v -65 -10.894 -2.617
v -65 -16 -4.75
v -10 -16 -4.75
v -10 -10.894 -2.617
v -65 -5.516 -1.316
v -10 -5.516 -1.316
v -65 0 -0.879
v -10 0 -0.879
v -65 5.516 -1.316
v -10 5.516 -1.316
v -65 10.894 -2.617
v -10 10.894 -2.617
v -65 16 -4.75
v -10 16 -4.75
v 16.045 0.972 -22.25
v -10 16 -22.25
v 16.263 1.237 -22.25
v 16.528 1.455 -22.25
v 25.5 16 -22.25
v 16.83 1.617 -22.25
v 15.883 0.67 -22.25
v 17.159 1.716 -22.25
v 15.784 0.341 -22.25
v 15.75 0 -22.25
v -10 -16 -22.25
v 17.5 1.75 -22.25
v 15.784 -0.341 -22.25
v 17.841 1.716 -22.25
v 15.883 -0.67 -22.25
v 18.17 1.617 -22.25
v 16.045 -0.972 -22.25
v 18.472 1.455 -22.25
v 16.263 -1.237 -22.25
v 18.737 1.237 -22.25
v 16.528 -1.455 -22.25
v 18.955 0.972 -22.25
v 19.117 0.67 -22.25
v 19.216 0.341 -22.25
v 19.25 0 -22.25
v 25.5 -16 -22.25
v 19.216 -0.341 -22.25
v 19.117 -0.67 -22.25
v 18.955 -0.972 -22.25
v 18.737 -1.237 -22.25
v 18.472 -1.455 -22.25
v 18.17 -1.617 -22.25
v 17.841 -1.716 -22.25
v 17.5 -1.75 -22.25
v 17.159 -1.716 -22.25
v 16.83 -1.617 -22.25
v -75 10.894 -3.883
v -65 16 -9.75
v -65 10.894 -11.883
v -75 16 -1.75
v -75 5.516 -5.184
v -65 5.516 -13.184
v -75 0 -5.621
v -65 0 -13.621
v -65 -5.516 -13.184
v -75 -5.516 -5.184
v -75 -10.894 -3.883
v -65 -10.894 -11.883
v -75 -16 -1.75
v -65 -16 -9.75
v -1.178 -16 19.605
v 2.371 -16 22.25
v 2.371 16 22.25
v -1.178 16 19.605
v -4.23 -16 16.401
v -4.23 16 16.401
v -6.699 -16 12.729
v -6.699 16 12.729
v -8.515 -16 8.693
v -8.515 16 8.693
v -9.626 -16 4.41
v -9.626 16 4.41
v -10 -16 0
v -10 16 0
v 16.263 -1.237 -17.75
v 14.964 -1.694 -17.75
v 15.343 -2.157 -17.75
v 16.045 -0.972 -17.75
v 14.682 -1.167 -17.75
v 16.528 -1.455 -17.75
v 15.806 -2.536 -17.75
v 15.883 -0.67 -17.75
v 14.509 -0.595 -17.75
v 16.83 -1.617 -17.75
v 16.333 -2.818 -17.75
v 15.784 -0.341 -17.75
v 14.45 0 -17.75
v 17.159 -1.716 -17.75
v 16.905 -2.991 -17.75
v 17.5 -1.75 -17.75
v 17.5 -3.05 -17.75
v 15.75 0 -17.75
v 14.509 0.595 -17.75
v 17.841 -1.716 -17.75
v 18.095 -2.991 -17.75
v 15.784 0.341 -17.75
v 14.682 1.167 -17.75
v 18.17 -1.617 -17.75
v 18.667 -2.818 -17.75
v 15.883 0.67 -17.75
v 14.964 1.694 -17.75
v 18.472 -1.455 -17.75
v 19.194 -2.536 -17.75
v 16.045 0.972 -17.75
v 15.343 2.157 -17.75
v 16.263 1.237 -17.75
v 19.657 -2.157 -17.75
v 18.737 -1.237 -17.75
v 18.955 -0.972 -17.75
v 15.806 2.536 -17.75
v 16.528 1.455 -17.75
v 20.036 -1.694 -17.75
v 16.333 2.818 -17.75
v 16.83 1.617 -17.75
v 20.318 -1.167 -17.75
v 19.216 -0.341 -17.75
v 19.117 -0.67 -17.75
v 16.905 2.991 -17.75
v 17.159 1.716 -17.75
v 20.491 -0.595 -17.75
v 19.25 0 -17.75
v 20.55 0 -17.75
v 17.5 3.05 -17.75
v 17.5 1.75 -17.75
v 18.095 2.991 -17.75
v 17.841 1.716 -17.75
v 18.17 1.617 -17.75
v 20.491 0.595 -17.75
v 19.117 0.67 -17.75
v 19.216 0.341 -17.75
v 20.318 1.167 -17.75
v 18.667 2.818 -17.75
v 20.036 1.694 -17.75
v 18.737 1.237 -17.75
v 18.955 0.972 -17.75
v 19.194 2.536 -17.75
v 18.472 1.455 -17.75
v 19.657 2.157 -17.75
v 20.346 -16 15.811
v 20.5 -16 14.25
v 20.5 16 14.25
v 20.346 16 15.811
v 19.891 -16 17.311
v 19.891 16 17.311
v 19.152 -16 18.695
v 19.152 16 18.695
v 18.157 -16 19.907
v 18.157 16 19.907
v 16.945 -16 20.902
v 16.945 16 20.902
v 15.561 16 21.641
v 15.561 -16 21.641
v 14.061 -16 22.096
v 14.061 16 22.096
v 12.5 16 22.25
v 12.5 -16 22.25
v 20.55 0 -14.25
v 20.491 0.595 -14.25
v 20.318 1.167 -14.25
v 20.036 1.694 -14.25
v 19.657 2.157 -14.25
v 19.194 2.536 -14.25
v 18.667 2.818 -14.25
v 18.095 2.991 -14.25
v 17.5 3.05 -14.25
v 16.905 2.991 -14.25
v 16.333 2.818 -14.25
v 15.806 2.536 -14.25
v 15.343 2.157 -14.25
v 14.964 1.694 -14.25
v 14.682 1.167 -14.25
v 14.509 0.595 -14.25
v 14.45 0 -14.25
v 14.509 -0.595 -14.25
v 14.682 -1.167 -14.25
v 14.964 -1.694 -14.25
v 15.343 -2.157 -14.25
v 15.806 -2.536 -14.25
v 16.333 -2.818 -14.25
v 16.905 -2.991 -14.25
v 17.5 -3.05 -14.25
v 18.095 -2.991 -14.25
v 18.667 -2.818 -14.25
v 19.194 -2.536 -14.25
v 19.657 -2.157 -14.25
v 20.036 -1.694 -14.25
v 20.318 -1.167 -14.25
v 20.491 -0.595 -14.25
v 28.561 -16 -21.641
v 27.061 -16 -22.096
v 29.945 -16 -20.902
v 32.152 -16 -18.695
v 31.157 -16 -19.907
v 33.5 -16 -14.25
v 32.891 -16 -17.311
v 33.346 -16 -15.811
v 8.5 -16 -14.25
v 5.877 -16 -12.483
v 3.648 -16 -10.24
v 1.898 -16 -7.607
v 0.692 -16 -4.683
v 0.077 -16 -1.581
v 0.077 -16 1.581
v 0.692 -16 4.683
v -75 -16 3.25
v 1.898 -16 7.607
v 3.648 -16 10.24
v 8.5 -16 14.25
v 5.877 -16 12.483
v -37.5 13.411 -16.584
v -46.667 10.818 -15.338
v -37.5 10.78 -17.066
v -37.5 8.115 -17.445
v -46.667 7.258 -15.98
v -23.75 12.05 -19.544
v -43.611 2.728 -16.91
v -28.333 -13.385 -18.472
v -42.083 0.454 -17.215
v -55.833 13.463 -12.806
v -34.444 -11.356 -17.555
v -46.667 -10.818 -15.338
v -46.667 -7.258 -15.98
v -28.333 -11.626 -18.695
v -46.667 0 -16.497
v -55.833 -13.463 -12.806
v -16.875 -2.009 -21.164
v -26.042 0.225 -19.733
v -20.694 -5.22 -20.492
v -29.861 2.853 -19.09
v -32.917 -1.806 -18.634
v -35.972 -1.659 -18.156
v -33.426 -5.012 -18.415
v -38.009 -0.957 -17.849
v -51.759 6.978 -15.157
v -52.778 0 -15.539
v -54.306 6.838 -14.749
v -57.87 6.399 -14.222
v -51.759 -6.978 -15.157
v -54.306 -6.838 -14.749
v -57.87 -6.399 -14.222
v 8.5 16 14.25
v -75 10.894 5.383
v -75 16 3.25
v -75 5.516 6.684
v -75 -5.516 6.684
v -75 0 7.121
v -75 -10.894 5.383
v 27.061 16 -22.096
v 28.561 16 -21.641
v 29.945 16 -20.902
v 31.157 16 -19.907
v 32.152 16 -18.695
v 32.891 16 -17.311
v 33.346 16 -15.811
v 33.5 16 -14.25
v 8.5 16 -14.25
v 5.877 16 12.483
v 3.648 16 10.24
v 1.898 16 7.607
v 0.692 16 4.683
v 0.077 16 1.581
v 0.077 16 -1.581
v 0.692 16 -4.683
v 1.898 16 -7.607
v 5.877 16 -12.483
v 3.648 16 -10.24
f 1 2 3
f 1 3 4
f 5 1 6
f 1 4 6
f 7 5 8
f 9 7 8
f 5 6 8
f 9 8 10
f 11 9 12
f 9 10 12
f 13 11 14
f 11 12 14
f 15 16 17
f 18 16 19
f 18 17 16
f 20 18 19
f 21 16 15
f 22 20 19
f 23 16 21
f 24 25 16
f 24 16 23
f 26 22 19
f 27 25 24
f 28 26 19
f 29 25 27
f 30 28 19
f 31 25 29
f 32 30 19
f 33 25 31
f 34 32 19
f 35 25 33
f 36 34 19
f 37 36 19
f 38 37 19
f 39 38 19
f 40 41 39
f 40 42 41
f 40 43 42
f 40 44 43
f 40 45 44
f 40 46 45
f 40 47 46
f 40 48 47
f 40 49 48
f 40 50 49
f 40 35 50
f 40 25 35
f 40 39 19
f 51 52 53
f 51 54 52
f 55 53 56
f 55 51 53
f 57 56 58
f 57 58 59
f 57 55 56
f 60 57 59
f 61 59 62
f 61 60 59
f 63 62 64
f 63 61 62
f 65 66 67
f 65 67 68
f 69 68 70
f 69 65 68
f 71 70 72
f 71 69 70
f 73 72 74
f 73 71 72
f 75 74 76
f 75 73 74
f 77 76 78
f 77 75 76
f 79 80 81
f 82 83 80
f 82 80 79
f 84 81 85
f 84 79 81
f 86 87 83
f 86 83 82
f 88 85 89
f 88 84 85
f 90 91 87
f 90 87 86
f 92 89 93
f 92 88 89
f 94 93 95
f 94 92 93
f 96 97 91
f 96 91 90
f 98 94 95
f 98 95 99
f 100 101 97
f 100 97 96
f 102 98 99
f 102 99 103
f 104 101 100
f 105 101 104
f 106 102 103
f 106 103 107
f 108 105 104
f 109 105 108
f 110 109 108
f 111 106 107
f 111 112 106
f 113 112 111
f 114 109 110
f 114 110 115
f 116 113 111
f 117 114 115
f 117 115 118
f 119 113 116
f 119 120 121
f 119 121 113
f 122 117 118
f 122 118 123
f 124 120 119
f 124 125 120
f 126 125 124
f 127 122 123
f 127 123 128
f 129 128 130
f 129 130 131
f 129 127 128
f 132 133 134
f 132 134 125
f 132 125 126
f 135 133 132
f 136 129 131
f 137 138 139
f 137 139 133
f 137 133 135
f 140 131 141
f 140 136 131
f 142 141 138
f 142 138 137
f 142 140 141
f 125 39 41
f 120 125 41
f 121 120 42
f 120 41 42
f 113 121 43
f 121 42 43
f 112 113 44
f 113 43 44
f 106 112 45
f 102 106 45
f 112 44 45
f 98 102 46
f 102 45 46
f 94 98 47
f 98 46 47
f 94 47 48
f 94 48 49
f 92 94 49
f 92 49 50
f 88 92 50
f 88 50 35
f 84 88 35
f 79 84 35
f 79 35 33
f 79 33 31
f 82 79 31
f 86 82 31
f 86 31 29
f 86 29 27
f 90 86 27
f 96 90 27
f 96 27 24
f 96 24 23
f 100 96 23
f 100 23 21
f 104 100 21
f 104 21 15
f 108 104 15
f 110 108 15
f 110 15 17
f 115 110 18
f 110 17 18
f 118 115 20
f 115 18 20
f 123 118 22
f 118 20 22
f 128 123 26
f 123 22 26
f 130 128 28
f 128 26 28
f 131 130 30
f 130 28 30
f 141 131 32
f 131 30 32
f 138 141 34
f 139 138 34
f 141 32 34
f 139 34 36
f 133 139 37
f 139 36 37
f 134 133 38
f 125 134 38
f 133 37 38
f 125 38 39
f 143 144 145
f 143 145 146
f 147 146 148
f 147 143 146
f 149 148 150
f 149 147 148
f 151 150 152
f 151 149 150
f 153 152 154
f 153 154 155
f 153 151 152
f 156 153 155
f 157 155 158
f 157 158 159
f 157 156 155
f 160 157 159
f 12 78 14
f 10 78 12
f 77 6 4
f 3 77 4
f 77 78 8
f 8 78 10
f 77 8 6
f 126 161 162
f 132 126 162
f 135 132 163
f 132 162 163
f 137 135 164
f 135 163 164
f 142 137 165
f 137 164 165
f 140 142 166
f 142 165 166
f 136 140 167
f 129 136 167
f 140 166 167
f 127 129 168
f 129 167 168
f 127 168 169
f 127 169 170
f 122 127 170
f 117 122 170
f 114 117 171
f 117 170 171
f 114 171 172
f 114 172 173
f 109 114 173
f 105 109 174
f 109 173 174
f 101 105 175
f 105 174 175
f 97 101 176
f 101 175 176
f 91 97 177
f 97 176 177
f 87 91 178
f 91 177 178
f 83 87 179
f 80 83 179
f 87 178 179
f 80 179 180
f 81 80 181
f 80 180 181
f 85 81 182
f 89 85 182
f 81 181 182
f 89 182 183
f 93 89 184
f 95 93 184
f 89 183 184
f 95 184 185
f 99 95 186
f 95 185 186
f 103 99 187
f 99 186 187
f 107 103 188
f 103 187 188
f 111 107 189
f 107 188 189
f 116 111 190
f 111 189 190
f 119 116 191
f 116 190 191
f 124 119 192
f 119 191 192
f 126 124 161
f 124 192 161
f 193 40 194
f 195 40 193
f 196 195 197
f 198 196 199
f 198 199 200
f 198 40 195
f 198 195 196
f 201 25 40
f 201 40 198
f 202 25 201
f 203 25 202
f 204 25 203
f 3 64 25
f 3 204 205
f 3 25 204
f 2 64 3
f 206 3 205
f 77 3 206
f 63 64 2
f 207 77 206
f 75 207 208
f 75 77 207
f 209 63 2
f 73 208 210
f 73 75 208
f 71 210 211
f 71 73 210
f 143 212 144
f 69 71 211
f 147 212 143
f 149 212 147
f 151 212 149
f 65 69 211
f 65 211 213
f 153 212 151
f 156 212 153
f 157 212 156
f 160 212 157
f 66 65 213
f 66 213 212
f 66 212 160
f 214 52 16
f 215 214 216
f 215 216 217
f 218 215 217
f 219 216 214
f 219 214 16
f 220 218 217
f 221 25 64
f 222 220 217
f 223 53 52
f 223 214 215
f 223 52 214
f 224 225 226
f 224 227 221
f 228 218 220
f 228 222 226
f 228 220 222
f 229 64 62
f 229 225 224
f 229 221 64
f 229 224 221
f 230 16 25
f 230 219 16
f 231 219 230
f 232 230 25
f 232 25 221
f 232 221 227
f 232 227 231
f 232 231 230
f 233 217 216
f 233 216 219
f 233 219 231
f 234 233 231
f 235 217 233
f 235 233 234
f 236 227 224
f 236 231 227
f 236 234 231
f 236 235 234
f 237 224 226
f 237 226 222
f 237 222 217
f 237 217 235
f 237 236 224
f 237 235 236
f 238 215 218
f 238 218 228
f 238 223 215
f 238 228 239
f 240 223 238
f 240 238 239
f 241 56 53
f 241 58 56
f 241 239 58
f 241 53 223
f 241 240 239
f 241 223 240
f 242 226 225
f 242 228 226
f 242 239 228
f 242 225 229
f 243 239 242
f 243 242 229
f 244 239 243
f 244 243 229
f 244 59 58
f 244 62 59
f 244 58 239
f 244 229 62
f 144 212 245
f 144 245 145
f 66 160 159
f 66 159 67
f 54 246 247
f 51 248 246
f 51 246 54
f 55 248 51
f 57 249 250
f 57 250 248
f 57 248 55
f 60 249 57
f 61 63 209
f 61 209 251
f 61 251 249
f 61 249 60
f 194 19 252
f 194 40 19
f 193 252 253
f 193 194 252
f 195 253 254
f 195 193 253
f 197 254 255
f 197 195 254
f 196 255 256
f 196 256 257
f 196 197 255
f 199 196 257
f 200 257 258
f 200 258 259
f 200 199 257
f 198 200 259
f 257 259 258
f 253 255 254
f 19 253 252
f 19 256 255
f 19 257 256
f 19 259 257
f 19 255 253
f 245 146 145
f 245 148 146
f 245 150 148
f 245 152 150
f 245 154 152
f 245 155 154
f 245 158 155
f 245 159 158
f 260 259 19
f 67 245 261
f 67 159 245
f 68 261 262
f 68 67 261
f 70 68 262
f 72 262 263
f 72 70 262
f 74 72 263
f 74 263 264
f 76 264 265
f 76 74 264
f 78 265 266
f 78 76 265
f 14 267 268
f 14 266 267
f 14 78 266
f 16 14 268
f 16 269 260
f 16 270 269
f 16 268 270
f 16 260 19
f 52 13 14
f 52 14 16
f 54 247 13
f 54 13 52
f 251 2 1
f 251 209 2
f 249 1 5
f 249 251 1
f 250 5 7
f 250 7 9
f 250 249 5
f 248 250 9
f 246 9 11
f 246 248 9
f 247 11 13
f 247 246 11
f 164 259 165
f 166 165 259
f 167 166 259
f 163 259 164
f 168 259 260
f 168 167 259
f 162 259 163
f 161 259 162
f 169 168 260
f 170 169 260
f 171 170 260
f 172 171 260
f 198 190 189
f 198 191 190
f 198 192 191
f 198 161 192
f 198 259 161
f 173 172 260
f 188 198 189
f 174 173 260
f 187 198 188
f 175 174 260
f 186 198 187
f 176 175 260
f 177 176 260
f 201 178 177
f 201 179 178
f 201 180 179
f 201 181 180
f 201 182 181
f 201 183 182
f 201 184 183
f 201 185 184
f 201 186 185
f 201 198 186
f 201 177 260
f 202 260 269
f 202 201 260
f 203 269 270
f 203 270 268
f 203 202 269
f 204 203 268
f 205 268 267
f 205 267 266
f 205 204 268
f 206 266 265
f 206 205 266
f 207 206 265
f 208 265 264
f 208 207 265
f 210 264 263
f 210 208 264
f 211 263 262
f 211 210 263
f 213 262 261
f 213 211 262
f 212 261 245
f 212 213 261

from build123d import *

# Parameters (mm, degrees)
F1_DEPTH      = 16
F1_DEPTH_BACK = 16
F3_DEPTH      = 55
F8_R          = 1.75
F9_DEPTH      = 25
F10_R         = 3.05
F11_DEPTH     = 3.5


with BuildPart() as f1:
    # F0 (on Front) → F1 (new body, two sides)
    with BuildSketch(Plane.XZ) as f1_sk:
        with BuildLine():
            ThreePointArc((8.5, -14.25), (0, 0), (8.5, 14.25))
            Line((8.5, 14.25), (20.5, 14.25))
            ThreePointArc((20.5, 14.25), (18.1568542495, 19.9068542495), (12.5, 22.25))
            Line((12.5, 22.25), (2.3706777177, 22.25))
            ThreePointArc((2.3706777177, 22.25), (-6.6993882302, 12.7288664774), (-10, 0))
            Line((-10, 0), (-10, -22.25))
            Line((-10, -22.25), (25.5, -22.25))
            ThreePointArc((25.5, -22.25), (31.1568542495, -19.9068542495), (33.5, -14.25))
            Line((33.5, -14.25), (8.5, -14.25))
        make_face()
    extrude(amount=F1_DEPTH)
    extrude(f1_sk.sketch, amount=-F1_DEPTH_BACK)

    # F2 (on face) → F3 (join)
    with BuildSketch(Plane(origin=(-10, 0, 0), x_dir=(0, -1, 0), z_dir=(-1, 0, 0))):
        with BuildLine():
            Line((16, -9.75), (16, -4.75))
            ThreePointArc((16, -4.75), (0, -0.8787648325), (-16, -4.75))
            Line((-16, -4.75), (-16, -9.75))
            ThreePointArc((-16, -9.75), (0, -13.6212351675), (16, -9.75))
        make_face()
    extrude(amount=F3_DEPTH)

    # F3_face (on face) → F5 section 0
    with BuildSketch(Plane(origin=(-10, 0, -17.2392152615), x_dir=(0, -1, 0), z_dir=(-1, 0, 0))):
        with BuildLine():
            ThreePointArc((16, 7.4892152615), (0, 3.617980094), (-16, 7.4892152615))
            Line((-16, 7.4892152615), (-16, -5.0107847385))
            Line((-16, -5.0107847385), (16, -5.0107847385))
            Line((16, -5.0107847385), (16, 7.4892152615))
        make_face()
    # F3_face1 (on face) → F5 section 1
    with BuildSketch(Plane(origin=(-65, 0, -7.25), x_dir=(0, -1, 0), z_dir=(-1, 0, 0))):
        with BuildLine():
            Line((-16, 2.5), (-16, -2.5))
            ThreePointArc((-16, -2.5), (0, -6.3712351675), (16, -2.5))
            Line((16, -2.5), (16, 2.5))
            ThreePointArc((16, 2.5), (0, 6.3712351675), (-16, 2.5))
        make_face()
    loft()

    # F3_face1 (on face) → F7 section 0
    with BuildSketch(Plane(origin=(-65, 0, -7.25), x_dir=(0, -1, 0), z_dir=(-1, 0, 0))):
        with BuildLine():
            Line((-16, 2.5), (-16, -2.5))
            ThreePointArc((-16, -2.5), (0, -6.3712351675), (16, -2.5))
            Line((16, -2.5), (16, 2.5))
            ThreePointArc((16, 2.5), (0, 6.3712351675), (-16, 2.5))
        make_face()
    # F6 (on offset) → F7 section 1
    with BuildSketch(Plane(origin=(-75, 0, 0), x_dir=(0, -1, 0), z_dir=(-1, 0, 0))):
        with BuildLine():
            ThreePointArc((-16, -1.75), (0, -5.6212351675), (16, -1.75))
            Line((16, -1.75), (16, 3.25))
            ThreePointArc((16, 3.25), (0, 7.1212351675), (-16, 3.25))
            Line((-16, 3.25), (-16, -1.75))
        make_face()
    loft()

    # F8 (on face) → F9 (cut)
    with BuildSketch(Plane(origin=(0, 0, -22.25), x_dir=(1, 0, 0), z_dir=(0, 0, -1))):
        with Locations((17.5, 0)):
            Circle(F8_R)
    extrude(amount=-F9_DEPTH, mode=Mode.SUBTRACT)

    # F10 (on face) → F11 (cut)
    with BuildSketch(Plane.XY.offset(-14.25)):
        with Locations((17.5, 0)):
            Circle(F10_R)
    extrude(amount=-F11_DEPTH, mode=Mode.SUBTRACT)


solid = f1.part
